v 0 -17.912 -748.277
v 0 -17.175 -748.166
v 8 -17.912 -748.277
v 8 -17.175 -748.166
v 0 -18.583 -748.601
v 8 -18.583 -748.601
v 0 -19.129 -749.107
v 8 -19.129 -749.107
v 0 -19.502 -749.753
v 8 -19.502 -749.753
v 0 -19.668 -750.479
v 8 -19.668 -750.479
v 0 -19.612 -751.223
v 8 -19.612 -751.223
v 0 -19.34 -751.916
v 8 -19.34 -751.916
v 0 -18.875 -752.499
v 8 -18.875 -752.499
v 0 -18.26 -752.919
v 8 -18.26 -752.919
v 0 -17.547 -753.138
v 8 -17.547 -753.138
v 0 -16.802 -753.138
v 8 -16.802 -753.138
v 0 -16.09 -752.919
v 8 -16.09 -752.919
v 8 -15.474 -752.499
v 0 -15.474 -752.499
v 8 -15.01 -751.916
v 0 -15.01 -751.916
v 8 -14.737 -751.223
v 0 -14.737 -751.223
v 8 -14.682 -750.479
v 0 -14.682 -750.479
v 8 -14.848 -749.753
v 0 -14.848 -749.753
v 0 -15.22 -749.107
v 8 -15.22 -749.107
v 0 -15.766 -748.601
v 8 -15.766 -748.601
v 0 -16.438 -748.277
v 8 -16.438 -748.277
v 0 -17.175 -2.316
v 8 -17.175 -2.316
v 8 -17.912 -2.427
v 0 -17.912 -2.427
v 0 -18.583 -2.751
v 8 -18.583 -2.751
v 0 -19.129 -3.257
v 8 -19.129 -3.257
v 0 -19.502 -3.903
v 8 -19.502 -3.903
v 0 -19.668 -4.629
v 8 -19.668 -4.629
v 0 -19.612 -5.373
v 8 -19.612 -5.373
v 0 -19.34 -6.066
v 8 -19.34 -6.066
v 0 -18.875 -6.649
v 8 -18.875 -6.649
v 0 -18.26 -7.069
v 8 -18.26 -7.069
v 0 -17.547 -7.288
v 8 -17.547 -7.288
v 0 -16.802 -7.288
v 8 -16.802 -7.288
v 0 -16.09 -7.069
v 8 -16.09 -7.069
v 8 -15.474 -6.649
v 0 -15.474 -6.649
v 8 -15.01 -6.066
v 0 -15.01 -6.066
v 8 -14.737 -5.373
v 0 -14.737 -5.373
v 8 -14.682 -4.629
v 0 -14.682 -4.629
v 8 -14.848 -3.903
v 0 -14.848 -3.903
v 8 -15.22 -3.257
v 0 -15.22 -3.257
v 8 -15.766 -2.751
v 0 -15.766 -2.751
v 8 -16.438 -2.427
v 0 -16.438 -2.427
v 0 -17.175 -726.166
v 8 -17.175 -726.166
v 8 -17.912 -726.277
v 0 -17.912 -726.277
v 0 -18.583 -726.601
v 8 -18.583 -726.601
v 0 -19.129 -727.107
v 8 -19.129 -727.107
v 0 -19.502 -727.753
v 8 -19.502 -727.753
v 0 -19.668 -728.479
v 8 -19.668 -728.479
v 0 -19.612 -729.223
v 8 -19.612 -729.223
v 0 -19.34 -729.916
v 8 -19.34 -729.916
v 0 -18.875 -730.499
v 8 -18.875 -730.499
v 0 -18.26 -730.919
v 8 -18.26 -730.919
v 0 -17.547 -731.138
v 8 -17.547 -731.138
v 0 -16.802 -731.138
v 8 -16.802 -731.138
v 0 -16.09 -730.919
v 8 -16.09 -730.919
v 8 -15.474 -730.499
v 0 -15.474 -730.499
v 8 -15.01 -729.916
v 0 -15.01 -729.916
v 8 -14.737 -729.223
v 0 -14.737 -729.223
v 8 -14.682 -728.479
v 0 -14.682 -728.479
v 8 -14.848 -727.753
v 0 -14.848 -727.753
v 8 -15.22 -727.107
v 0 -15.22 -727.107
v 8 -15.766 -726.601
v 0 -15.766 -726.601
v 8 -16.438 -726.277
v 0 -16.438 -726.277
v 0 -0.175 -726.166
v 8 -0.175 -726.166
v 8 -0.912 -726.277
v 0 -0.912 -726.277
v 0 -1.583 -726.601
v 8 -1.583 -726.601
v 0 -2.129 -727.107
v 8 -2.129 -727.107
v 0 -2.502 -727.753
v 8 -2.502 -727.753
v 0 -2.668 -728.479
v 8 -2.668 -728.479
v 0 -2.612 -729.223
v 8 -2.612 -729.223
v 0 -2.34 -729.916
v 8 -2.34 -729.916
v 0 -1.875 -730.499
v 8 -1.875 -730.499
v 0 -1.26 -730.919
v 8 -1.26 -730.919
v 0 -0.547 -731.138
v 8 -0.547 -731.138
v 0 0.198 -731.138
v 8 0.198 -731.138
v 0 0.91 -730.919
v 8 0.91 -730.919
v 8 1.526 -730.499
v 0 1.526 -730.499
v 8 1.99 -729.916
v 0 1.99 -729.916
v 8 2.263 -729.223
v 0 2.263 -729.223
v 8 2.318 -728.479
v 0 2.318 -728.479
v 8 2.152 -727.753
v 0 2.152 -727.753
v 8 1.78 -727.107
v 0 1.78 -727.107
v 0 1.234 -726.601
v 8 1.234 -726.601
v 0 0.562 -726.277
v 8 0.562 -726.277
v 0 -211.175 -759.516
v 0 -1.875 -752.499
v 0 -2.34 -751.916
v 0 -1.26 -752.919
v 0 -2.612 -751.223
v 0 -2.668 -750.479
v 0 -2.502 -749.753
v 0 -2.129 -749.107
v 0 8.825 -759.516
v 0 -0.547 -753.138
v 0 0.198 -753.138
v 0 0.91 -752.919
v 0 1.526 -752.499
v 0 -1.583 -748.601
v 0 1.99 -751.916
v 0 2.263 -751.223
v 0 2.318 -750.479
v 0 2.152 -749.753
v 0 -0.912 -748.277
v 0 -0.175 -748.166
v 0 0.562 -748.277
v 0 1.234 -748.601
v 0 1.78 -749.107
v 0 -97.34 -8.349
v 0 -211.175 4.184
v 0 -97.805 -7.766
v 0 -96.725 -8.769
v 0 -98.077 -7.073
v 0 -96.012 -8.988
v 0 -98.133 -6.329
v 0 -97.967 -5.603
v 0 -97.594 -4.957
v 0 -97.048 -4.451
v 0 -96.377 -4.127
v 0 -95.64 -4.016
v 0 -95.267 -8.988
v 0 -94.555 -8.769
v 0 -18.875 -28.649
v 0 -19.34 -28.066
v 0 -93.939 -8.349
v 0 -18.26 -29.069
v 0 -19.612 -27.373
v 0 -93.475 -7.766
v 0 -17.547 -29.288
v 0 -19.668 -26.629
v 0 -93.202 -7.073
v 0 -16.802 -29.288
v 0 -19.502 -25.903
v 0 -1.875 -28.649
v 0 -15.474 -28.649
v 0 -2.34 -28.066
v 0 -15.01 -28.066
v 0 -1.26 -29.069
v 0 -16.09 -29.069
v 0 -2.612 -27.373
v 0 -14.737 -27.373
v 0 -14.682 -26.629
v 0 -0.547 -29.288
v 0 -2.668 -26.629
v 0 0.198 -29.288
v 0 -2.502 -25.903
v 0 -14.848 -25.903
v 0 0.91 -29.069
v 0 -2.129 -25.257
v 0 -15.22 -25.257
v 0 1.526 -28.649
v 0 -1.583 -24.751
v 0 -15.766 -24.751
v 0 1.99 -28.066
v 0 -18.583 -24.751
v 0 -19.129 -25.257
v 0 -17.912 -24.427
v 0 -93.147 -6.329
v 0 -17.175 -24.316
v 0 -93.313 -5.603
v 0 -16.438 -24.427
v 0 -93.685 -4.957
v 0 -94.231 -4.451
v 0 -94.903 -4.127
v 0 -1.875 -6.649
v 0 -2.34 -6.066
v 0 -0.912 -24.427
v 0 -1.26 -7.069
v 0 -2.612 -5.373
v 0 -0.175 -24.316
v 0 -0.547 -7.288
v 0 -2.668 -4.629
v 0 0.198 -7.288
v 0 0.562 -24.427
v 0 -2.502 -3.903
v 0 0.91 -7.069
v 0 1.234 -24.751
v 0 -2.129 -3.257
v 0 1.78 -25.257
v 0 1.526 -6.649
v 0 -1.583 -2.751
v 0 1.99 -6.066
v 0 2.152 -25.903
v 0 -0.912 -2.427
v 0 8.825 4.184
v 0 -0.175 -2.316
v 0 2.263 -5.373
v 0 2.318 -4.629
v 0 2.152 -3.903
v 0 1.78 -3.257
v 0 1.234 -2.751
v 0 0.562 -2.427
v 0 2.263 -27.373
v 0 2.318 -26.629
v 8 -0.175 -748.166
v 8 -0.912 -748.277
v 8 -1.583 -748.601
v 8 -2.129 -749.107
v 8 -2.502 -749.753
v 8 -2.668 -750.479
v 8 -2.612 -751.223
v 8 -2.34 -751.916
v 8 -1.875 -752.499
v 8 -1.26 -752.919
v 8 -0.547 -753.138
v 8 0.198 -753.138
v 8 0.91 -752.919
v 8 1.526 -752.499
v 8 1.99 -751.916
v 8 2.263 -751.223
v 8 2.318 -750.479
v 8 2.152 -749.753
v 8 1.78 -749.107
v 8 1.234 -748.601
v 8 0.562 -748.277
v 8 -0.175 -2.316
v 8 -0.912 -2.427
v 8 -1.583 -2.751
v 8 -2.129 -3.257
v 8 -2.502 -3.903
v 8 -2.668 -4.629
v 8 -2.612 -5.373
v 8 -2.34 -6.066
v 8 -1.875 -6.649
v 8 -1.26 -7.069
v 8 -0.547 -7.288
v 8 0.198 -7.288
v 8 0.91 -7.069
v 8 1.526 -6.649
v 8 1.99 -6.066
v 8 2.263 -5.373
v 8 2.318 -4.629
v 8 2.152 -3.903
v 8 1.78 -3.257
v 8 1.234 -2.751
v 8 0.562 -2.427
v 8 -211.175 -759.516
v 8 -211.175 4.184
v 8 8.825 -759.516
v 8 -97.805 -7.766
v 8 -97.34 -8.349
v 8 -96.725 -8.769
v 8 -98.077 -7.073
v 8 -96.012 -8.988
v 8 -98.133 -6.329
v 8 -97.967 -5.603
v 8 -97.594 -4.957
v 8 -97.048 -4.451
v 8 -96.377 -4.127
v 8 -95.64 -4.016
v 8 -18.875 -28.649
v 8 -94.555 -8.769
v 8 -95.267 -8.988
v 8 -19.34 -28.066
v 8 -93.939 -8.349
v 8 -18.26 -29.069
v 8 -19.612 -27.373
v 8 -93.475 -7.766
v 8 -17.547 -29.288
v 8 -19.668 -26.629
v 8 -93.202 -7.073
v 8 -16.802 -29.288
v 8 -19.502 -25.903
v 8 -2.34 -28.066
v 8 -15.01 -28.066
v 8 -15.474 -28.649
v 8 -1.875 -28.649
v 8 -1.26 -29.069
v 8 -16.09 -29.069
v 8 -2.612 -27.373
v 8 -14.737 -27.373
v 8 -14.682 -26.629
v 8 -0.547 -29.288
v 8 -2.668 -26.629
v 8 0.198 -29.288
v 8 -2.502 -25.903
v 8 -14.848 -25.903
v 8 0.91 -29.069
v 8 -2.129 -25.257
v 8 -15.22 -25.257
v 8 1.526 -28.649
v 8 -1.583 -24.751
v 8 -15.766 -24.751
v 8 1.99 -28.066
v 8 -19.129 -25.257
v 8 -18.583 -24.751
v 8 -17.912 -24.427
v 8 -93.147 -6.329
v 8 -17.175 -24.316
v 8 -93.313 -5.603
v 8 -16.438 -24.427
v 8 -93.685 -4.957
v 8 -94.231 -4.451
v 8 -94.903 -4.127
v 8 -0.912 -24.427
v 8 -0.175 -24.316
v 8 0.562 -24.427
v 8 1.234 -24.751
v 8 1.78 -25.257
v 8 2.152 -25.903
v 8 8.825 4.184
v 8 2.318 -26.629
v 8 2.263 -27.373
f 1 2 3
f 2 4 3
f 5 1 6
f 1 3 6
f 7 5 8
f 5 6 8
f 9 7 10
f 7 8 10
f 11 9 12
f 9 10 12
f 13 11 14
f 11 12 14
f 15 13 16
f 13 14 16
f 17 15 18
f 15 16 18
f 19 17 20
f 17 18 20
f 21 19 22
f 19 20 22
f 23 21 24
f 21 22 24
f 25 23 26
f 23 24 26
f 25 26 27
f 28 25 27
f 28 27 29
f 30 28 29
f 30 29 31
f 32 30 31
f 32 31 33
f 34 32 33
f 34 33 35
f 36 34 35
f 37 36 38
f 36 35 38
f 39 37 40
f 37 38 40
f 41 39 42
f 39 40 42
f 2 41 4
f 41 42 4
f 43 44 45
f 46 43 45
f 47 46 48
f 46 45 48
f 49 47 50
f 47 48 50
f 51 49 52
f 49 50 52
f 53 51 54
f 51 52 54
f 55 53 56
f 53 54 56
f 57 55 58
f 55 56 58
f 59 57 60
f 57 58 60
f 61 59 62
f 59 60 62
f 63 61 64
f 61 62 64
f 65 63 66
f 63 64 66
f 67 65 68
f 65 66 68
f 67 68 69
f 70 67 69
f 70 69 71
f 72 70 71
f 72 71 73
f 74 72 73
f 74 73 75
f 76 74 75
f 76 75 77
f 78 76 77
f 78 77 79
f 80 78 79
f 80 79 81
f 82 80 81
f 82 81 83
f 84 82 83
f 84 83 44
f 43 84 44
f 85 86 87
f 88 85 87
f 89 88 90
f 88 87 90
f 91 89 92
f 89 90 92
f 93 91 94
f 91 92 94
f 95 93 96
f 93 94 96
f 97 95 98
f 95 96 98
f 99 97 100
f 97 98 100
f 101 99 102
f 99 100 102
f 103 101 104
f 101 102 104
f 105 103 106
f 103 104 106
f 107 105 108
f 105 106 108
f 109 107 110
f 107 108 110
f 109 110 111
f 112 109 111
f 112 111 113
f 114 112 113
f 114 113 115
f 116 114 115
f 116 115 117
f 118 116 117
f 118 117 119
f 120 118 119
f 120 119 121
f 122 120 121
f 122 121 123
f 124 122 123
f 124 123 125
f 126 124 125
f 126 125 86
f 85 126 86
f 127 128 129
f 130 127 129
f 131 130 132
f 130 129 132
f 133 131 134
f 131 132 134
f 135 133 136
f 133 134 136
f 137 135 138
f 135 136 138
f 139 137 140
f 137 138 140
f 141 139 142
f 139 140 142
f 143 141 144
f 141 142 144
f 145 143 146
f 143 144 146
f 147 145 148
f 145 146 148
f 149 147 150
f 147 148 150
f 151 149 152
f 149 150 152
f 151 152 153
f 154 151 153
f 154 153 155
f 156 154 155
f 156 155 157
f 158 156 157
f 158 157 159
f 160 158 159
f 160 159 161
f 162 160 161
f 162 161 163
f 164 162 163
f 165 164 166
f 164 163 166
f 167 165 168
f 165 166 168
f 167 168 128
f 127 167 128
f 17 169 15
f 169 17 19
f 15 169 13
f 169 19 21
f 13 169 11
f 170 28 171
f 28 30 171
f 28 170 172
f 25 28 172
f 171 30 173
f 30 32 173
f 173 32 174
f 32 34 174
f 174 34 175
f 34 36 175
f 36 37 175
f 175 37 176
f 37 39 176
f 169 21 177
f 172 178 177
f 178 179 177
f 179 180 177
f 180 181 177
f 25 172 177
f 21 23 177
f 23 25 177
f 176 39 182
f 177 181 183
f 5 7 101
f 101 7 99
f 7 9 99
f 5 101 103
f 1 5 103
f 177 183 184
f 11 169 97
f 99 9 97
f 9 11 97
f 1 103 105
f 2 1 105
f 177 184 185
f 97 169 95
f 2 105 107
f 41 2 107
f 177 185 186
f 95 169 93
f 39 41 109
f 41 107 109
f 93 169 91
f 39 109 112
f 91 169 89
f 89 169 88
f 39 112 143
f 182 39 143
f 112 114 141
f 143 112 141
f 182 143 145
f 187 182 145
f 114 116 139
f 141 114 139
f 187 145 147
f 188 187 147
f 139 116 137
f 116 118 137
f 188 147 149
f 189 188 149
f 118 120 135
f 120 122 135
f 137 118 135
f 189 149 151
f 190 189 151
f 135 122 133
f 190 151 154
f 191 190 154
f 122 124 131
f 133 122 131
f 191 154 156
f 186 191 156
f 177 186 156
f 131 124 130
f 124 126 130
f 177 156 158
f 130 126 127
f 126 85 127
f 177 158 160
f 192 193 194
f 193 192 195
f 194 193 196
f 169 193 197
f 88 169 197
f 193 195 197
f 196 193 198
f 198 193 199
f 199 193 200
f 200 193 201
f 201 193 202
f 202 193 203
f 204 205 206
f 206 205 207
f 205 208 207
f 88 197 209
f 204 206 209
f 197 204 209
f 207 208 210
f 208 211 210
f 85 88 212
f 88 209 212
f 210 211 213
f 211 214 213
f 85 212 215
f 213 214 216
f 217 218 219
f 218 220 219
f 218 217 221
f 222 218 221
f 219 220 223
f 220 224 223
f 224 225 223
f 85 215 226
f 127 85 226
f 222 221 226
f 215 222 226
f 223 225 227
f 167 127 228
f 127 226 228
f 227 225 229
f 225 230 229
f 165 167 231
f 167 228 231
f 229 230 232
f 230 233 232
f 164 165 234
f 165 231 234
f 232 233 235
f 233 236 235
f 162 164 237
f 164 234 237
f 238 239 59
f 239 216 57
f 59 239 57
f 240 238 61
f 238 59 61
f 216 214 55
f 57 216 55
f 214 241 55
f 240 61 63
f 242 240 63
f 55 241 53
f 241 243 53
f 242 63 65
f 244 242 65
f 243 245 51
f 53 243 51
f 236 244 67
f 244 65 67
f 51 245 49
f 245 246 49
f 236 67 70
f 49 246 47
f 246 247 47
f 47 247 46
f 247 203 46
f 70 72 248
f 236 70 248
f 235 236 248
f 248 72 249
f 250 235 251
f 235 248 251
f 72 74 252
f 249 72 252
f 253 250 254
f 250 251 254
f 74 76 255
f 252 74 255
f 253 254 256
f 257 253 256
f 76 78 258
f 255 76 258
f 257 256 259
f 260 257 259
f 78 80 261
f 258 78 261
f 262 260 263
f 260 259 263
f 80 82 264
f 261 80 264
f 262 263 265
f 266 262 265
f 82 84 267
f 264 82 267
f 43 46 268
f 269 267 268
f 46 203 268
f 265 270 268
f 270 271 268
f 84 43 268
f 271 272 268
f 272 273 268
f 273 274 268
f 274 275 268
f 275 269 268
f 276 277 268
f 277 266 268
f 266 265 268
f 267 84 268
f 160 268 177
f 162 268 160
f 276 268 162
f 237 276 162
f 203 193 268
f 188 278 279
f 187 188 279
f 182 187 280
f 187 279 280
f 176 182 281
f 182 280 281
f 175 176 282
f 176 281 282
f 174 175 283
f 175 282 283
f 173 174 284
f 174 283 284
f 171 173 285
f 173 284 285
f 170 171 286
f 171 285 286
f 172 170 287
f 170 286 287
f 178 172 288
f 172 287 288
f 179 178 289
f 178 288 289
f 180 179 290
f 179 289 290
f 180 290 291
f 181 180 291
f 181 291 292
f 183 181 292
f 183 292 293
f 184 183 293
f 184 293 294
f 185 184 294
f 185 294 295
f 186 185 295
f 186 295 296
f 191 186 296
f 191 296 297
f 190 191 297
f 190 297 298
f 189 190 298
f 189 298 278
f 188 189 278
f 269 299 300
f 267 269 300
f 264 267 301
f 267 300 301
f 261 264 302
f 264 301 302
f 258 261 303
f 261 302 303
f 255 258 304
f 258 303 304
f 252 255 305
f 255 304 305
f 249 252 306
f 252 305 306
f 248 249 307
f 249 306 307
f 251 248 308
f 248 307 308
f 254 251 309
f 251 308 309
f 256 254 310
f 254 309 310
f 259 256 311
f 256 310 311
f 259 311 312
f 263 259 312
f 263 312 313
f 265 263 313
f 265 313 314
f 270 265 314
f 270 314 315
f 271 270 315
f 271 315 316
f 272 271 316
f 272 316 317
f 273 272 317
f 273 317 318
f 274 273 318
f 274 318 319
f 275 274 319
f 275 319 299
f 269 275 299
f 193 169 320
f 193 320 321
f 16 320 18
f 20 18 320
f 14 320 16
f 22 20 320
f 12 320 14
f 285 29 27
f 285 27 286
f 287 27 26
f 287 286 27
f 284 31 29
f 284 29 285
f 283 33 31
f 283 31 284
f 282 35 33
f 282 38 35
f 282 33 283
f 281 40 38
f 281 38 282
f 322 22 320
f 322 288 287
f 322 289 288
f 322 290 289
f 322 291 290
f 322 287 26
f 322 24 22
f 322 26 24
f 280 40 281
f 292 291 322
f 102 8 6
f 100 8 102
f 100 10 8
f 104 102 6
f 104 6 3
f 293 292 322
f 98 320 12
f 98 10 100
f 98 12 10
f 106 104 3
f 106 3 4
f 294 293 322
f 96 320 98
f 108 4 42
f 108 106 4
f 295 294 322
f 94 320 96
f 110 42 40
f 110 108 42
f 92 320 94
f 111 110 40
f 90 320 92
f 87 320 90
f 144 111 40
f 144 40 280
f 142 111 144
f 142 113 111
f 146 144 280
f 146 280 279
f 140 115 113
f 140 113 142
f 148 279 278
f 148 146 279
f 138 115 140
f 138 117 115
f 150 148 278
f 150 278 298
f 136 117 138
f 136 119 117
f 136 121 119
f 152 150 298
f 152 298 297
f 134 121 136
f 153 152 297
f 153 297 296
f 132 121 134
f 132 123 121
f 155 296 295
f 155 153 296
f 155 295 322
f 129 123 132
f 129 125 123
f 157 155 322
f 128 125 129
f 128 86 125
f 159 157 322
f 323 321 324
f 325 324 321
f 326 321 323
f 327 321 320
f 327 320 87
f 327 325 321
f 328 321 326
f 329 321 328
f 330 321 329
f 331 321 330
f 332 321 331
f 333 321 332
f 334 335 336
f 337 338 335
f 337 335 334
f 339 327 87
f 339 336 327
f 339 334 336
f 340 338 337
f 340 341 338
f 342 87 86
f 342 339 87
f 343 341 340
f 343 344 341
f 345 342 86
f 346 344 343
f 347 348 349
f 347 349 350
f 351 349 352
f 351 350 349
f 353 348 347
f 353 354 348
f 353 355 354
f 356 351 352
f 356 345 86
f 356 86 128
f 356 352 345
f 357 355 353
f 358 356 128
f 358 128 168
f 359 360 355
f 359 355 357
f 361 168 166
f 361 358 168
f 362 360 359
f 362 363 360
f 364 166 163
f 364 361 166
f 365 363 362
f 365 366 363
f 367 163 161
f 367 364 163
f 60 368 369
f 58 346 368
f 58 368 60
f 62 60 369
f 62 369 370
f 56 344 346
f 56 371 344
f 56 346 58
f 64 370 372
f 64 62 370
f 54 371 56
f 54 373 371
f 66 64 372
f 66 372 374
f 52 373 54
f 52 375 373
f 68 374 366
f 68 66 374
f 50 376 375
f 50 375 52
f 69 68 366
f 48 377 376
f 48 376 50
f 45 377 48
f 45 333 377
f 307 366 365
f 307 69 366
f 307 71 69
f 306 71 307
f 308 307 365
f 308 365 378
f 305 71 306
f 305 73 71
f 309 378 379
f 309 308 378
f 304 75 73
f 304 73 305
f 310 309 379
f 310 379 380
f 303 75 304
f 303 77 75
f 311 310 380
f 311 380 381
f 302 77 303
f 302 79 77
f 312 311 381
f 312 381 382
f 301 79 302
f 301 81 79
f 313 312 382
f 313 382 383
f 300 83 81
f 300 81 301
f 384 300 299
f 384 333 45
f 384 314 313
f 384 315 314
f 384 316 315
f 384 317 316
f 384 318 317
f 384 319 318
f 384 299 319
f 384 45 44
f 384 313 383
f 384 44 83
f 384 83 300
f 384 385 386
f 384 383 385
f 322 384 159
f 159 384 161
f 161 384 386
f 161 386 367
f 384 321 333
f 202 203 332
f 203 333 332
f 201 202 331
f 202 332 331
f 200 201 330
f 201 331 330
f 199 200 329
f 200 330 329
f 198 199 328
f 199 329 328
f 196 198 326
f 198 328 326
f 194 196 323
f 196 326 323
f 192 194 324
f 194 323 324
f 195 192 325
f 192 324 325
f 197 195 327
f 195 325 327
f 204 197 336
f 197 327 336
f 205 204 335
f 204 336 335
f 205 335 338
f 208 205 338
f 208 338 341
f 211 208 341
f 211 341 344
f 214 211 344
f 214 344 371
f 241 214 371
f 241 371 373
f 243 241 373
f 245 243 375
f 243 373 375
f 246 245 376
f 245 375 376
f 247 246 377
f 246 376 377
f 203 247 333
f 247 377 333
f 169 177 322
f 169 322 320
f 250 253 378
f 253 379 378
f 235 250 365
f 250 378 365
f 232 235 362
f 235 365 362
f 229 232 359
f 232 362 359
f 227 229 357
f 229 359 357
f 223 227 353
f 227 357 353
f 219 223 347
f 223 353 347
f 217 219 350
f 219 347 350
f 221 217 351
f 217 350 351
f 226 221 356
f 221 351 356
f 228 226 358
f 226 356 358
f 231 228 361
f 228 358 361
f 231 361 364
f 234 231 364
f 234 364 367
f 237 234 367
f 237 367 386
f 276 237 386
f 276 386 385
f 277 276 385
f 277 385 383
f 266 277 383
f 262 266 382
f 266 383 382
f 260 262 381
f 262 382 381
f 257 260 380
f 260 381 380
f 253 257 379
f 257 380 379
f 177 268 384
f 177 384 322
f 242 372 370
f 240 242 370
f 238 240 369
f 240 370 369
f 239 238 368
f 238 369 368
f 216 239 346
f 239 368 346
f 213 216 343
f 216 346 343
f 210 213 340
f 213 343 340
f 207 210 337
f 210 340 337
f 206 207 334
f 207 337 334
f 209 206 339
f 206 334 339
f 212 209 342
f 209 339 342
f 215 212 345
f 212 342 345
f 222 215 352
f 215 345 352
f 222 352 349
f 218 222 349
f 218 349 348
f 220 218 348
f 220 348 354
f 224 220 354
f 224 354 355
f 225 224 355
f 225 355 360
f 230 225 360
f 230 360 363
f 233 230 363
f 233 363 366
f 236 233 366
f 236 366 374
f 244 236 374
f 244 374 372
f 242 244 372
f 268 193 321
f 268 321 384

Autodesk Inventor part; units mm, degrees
ref_plane "YZ Plane" through (0, 0, 0) normal (1, 0, 0) x (0, 1, 0)
ref_plane "XZ Plane" through (0, 0, 0) normal (0, 1, 0) x (-1, 0, 0)
ref_plane "XY Plane" through (0, 0, 0) normal (0, 0, 1) x (1, 0, 0)
sketch "Skizze1" plane through (0, 0, 0) normal (1, 0, 0) x (0, 1, 0)
  line L0 (-211.1748, 4.1838) -> (8.8252, 4.1838)
  line L1 (8.8252, 4.1838) -> (8.8252, -759.5162)
  line L2 (8.8252, -759.5162) -> (-211.1748, -759.5162)
  line L3 (-211.1748, -759.5162) -> (-211.1748, 4.1838)
  point P0 (0, 0)
  dimension "d0" = 763.7
  dimension "d1" = 220
extrude "Extrusion1" add sketch "Skizze1" along normal blind 8
sketch "Skizze2" plane through (0, 0, 0) normal (-1, 0, 0) x (0, 0, 1)
  circle A0 centre (-4.8162, -0.1748) radius 2.5
  line L0 (4.1838, 8.8252) -> (4.1838, -211.1748) projected
  line L1 (-759.5162, 8.8252) -> (4.1838, 8.8252) projected
  circle A1 centre (-4.8162, -17.1748) radius 2.5
  circle A2 centre (-26.8162, -17.1748) radius 2.5
  circle A3 centre (-26.8162, -0.1748) radius 2.5
  line L2 (-377.7412, 9.6508) -> (-377.7412, -210.3492) construction
  line L3 (4.1838, -211.1748) -> (-759.5162, -211.1748) projected
  line L4 (-377.6662, 8.8252) -> (-157.6662, 8.8252) construction
  circle A4 centre (-750.6662, -0.1748) radius 2.5
  circle A5 centre (-750.6662, -17.1748) radius 2.5
  circle A6 centre (-728.6662, -17.1748) radius 2.5
  circle A7 centre (-728.6662, -0.1748) radius 2.5
  circle A8 centre (-6.5162, -95.6398) radius 2.5
  point P0 (0, 0)
  point P1 (-755.4823, 0)
  dimension "d4" = 5
  dimension "d5" = 9
  dimension "d6" = 9
  dimension "d7" = 5
  dimension "d8" = 5
  dimension "d9" = 5
  dimension "d10" = 17
  dimension "d11" = 9
  dimension "d12" = 22
  dimension "d13" = 17
  dimension "d14" = 17
  dimension "d15" = 22
  dimension "d17" = 381.925
  dimension "d67" = 5
  dimension "d68" = 10.7
  dimension "d69" = 104.465
hole "Bohrung1" at (0, -0.1748, -4.8162) direction (1, 0, 0) diameter 5 end through all
hole "Bohrung2" at (0, -17.1748, -4.8162) direction (1, 0, 0) diameter 5 end through all
hole "Bohrung3" at (0, -17.1748, -26.8162) direction (1, 0, 0) diameter 5 end through all
hole "Bohrung4" at (0, -0.1748, -26.8162) at (0, -17.1748, -750.6662) direction (1, 0, 0) diameter 5 end through all
hole "Bohrung5" at (0, -0.1748, -750.6662) direction (1, 0, 0) diameter 5 end through all
hole "Bohrung6" at (0, -0.1748, -728.6662) direction (1, 0, 0) diameter 5 end through all
hole "Bohrung7" at (0, -17.1748, -728.6662) direction (1, 0, 0) diameter 5 end through all
hole "Bohrung8" at (0, -95.6398, -6.5162) direction (1, 0, 0) diameter 5 end through all
properties part number "FahneHolz"
